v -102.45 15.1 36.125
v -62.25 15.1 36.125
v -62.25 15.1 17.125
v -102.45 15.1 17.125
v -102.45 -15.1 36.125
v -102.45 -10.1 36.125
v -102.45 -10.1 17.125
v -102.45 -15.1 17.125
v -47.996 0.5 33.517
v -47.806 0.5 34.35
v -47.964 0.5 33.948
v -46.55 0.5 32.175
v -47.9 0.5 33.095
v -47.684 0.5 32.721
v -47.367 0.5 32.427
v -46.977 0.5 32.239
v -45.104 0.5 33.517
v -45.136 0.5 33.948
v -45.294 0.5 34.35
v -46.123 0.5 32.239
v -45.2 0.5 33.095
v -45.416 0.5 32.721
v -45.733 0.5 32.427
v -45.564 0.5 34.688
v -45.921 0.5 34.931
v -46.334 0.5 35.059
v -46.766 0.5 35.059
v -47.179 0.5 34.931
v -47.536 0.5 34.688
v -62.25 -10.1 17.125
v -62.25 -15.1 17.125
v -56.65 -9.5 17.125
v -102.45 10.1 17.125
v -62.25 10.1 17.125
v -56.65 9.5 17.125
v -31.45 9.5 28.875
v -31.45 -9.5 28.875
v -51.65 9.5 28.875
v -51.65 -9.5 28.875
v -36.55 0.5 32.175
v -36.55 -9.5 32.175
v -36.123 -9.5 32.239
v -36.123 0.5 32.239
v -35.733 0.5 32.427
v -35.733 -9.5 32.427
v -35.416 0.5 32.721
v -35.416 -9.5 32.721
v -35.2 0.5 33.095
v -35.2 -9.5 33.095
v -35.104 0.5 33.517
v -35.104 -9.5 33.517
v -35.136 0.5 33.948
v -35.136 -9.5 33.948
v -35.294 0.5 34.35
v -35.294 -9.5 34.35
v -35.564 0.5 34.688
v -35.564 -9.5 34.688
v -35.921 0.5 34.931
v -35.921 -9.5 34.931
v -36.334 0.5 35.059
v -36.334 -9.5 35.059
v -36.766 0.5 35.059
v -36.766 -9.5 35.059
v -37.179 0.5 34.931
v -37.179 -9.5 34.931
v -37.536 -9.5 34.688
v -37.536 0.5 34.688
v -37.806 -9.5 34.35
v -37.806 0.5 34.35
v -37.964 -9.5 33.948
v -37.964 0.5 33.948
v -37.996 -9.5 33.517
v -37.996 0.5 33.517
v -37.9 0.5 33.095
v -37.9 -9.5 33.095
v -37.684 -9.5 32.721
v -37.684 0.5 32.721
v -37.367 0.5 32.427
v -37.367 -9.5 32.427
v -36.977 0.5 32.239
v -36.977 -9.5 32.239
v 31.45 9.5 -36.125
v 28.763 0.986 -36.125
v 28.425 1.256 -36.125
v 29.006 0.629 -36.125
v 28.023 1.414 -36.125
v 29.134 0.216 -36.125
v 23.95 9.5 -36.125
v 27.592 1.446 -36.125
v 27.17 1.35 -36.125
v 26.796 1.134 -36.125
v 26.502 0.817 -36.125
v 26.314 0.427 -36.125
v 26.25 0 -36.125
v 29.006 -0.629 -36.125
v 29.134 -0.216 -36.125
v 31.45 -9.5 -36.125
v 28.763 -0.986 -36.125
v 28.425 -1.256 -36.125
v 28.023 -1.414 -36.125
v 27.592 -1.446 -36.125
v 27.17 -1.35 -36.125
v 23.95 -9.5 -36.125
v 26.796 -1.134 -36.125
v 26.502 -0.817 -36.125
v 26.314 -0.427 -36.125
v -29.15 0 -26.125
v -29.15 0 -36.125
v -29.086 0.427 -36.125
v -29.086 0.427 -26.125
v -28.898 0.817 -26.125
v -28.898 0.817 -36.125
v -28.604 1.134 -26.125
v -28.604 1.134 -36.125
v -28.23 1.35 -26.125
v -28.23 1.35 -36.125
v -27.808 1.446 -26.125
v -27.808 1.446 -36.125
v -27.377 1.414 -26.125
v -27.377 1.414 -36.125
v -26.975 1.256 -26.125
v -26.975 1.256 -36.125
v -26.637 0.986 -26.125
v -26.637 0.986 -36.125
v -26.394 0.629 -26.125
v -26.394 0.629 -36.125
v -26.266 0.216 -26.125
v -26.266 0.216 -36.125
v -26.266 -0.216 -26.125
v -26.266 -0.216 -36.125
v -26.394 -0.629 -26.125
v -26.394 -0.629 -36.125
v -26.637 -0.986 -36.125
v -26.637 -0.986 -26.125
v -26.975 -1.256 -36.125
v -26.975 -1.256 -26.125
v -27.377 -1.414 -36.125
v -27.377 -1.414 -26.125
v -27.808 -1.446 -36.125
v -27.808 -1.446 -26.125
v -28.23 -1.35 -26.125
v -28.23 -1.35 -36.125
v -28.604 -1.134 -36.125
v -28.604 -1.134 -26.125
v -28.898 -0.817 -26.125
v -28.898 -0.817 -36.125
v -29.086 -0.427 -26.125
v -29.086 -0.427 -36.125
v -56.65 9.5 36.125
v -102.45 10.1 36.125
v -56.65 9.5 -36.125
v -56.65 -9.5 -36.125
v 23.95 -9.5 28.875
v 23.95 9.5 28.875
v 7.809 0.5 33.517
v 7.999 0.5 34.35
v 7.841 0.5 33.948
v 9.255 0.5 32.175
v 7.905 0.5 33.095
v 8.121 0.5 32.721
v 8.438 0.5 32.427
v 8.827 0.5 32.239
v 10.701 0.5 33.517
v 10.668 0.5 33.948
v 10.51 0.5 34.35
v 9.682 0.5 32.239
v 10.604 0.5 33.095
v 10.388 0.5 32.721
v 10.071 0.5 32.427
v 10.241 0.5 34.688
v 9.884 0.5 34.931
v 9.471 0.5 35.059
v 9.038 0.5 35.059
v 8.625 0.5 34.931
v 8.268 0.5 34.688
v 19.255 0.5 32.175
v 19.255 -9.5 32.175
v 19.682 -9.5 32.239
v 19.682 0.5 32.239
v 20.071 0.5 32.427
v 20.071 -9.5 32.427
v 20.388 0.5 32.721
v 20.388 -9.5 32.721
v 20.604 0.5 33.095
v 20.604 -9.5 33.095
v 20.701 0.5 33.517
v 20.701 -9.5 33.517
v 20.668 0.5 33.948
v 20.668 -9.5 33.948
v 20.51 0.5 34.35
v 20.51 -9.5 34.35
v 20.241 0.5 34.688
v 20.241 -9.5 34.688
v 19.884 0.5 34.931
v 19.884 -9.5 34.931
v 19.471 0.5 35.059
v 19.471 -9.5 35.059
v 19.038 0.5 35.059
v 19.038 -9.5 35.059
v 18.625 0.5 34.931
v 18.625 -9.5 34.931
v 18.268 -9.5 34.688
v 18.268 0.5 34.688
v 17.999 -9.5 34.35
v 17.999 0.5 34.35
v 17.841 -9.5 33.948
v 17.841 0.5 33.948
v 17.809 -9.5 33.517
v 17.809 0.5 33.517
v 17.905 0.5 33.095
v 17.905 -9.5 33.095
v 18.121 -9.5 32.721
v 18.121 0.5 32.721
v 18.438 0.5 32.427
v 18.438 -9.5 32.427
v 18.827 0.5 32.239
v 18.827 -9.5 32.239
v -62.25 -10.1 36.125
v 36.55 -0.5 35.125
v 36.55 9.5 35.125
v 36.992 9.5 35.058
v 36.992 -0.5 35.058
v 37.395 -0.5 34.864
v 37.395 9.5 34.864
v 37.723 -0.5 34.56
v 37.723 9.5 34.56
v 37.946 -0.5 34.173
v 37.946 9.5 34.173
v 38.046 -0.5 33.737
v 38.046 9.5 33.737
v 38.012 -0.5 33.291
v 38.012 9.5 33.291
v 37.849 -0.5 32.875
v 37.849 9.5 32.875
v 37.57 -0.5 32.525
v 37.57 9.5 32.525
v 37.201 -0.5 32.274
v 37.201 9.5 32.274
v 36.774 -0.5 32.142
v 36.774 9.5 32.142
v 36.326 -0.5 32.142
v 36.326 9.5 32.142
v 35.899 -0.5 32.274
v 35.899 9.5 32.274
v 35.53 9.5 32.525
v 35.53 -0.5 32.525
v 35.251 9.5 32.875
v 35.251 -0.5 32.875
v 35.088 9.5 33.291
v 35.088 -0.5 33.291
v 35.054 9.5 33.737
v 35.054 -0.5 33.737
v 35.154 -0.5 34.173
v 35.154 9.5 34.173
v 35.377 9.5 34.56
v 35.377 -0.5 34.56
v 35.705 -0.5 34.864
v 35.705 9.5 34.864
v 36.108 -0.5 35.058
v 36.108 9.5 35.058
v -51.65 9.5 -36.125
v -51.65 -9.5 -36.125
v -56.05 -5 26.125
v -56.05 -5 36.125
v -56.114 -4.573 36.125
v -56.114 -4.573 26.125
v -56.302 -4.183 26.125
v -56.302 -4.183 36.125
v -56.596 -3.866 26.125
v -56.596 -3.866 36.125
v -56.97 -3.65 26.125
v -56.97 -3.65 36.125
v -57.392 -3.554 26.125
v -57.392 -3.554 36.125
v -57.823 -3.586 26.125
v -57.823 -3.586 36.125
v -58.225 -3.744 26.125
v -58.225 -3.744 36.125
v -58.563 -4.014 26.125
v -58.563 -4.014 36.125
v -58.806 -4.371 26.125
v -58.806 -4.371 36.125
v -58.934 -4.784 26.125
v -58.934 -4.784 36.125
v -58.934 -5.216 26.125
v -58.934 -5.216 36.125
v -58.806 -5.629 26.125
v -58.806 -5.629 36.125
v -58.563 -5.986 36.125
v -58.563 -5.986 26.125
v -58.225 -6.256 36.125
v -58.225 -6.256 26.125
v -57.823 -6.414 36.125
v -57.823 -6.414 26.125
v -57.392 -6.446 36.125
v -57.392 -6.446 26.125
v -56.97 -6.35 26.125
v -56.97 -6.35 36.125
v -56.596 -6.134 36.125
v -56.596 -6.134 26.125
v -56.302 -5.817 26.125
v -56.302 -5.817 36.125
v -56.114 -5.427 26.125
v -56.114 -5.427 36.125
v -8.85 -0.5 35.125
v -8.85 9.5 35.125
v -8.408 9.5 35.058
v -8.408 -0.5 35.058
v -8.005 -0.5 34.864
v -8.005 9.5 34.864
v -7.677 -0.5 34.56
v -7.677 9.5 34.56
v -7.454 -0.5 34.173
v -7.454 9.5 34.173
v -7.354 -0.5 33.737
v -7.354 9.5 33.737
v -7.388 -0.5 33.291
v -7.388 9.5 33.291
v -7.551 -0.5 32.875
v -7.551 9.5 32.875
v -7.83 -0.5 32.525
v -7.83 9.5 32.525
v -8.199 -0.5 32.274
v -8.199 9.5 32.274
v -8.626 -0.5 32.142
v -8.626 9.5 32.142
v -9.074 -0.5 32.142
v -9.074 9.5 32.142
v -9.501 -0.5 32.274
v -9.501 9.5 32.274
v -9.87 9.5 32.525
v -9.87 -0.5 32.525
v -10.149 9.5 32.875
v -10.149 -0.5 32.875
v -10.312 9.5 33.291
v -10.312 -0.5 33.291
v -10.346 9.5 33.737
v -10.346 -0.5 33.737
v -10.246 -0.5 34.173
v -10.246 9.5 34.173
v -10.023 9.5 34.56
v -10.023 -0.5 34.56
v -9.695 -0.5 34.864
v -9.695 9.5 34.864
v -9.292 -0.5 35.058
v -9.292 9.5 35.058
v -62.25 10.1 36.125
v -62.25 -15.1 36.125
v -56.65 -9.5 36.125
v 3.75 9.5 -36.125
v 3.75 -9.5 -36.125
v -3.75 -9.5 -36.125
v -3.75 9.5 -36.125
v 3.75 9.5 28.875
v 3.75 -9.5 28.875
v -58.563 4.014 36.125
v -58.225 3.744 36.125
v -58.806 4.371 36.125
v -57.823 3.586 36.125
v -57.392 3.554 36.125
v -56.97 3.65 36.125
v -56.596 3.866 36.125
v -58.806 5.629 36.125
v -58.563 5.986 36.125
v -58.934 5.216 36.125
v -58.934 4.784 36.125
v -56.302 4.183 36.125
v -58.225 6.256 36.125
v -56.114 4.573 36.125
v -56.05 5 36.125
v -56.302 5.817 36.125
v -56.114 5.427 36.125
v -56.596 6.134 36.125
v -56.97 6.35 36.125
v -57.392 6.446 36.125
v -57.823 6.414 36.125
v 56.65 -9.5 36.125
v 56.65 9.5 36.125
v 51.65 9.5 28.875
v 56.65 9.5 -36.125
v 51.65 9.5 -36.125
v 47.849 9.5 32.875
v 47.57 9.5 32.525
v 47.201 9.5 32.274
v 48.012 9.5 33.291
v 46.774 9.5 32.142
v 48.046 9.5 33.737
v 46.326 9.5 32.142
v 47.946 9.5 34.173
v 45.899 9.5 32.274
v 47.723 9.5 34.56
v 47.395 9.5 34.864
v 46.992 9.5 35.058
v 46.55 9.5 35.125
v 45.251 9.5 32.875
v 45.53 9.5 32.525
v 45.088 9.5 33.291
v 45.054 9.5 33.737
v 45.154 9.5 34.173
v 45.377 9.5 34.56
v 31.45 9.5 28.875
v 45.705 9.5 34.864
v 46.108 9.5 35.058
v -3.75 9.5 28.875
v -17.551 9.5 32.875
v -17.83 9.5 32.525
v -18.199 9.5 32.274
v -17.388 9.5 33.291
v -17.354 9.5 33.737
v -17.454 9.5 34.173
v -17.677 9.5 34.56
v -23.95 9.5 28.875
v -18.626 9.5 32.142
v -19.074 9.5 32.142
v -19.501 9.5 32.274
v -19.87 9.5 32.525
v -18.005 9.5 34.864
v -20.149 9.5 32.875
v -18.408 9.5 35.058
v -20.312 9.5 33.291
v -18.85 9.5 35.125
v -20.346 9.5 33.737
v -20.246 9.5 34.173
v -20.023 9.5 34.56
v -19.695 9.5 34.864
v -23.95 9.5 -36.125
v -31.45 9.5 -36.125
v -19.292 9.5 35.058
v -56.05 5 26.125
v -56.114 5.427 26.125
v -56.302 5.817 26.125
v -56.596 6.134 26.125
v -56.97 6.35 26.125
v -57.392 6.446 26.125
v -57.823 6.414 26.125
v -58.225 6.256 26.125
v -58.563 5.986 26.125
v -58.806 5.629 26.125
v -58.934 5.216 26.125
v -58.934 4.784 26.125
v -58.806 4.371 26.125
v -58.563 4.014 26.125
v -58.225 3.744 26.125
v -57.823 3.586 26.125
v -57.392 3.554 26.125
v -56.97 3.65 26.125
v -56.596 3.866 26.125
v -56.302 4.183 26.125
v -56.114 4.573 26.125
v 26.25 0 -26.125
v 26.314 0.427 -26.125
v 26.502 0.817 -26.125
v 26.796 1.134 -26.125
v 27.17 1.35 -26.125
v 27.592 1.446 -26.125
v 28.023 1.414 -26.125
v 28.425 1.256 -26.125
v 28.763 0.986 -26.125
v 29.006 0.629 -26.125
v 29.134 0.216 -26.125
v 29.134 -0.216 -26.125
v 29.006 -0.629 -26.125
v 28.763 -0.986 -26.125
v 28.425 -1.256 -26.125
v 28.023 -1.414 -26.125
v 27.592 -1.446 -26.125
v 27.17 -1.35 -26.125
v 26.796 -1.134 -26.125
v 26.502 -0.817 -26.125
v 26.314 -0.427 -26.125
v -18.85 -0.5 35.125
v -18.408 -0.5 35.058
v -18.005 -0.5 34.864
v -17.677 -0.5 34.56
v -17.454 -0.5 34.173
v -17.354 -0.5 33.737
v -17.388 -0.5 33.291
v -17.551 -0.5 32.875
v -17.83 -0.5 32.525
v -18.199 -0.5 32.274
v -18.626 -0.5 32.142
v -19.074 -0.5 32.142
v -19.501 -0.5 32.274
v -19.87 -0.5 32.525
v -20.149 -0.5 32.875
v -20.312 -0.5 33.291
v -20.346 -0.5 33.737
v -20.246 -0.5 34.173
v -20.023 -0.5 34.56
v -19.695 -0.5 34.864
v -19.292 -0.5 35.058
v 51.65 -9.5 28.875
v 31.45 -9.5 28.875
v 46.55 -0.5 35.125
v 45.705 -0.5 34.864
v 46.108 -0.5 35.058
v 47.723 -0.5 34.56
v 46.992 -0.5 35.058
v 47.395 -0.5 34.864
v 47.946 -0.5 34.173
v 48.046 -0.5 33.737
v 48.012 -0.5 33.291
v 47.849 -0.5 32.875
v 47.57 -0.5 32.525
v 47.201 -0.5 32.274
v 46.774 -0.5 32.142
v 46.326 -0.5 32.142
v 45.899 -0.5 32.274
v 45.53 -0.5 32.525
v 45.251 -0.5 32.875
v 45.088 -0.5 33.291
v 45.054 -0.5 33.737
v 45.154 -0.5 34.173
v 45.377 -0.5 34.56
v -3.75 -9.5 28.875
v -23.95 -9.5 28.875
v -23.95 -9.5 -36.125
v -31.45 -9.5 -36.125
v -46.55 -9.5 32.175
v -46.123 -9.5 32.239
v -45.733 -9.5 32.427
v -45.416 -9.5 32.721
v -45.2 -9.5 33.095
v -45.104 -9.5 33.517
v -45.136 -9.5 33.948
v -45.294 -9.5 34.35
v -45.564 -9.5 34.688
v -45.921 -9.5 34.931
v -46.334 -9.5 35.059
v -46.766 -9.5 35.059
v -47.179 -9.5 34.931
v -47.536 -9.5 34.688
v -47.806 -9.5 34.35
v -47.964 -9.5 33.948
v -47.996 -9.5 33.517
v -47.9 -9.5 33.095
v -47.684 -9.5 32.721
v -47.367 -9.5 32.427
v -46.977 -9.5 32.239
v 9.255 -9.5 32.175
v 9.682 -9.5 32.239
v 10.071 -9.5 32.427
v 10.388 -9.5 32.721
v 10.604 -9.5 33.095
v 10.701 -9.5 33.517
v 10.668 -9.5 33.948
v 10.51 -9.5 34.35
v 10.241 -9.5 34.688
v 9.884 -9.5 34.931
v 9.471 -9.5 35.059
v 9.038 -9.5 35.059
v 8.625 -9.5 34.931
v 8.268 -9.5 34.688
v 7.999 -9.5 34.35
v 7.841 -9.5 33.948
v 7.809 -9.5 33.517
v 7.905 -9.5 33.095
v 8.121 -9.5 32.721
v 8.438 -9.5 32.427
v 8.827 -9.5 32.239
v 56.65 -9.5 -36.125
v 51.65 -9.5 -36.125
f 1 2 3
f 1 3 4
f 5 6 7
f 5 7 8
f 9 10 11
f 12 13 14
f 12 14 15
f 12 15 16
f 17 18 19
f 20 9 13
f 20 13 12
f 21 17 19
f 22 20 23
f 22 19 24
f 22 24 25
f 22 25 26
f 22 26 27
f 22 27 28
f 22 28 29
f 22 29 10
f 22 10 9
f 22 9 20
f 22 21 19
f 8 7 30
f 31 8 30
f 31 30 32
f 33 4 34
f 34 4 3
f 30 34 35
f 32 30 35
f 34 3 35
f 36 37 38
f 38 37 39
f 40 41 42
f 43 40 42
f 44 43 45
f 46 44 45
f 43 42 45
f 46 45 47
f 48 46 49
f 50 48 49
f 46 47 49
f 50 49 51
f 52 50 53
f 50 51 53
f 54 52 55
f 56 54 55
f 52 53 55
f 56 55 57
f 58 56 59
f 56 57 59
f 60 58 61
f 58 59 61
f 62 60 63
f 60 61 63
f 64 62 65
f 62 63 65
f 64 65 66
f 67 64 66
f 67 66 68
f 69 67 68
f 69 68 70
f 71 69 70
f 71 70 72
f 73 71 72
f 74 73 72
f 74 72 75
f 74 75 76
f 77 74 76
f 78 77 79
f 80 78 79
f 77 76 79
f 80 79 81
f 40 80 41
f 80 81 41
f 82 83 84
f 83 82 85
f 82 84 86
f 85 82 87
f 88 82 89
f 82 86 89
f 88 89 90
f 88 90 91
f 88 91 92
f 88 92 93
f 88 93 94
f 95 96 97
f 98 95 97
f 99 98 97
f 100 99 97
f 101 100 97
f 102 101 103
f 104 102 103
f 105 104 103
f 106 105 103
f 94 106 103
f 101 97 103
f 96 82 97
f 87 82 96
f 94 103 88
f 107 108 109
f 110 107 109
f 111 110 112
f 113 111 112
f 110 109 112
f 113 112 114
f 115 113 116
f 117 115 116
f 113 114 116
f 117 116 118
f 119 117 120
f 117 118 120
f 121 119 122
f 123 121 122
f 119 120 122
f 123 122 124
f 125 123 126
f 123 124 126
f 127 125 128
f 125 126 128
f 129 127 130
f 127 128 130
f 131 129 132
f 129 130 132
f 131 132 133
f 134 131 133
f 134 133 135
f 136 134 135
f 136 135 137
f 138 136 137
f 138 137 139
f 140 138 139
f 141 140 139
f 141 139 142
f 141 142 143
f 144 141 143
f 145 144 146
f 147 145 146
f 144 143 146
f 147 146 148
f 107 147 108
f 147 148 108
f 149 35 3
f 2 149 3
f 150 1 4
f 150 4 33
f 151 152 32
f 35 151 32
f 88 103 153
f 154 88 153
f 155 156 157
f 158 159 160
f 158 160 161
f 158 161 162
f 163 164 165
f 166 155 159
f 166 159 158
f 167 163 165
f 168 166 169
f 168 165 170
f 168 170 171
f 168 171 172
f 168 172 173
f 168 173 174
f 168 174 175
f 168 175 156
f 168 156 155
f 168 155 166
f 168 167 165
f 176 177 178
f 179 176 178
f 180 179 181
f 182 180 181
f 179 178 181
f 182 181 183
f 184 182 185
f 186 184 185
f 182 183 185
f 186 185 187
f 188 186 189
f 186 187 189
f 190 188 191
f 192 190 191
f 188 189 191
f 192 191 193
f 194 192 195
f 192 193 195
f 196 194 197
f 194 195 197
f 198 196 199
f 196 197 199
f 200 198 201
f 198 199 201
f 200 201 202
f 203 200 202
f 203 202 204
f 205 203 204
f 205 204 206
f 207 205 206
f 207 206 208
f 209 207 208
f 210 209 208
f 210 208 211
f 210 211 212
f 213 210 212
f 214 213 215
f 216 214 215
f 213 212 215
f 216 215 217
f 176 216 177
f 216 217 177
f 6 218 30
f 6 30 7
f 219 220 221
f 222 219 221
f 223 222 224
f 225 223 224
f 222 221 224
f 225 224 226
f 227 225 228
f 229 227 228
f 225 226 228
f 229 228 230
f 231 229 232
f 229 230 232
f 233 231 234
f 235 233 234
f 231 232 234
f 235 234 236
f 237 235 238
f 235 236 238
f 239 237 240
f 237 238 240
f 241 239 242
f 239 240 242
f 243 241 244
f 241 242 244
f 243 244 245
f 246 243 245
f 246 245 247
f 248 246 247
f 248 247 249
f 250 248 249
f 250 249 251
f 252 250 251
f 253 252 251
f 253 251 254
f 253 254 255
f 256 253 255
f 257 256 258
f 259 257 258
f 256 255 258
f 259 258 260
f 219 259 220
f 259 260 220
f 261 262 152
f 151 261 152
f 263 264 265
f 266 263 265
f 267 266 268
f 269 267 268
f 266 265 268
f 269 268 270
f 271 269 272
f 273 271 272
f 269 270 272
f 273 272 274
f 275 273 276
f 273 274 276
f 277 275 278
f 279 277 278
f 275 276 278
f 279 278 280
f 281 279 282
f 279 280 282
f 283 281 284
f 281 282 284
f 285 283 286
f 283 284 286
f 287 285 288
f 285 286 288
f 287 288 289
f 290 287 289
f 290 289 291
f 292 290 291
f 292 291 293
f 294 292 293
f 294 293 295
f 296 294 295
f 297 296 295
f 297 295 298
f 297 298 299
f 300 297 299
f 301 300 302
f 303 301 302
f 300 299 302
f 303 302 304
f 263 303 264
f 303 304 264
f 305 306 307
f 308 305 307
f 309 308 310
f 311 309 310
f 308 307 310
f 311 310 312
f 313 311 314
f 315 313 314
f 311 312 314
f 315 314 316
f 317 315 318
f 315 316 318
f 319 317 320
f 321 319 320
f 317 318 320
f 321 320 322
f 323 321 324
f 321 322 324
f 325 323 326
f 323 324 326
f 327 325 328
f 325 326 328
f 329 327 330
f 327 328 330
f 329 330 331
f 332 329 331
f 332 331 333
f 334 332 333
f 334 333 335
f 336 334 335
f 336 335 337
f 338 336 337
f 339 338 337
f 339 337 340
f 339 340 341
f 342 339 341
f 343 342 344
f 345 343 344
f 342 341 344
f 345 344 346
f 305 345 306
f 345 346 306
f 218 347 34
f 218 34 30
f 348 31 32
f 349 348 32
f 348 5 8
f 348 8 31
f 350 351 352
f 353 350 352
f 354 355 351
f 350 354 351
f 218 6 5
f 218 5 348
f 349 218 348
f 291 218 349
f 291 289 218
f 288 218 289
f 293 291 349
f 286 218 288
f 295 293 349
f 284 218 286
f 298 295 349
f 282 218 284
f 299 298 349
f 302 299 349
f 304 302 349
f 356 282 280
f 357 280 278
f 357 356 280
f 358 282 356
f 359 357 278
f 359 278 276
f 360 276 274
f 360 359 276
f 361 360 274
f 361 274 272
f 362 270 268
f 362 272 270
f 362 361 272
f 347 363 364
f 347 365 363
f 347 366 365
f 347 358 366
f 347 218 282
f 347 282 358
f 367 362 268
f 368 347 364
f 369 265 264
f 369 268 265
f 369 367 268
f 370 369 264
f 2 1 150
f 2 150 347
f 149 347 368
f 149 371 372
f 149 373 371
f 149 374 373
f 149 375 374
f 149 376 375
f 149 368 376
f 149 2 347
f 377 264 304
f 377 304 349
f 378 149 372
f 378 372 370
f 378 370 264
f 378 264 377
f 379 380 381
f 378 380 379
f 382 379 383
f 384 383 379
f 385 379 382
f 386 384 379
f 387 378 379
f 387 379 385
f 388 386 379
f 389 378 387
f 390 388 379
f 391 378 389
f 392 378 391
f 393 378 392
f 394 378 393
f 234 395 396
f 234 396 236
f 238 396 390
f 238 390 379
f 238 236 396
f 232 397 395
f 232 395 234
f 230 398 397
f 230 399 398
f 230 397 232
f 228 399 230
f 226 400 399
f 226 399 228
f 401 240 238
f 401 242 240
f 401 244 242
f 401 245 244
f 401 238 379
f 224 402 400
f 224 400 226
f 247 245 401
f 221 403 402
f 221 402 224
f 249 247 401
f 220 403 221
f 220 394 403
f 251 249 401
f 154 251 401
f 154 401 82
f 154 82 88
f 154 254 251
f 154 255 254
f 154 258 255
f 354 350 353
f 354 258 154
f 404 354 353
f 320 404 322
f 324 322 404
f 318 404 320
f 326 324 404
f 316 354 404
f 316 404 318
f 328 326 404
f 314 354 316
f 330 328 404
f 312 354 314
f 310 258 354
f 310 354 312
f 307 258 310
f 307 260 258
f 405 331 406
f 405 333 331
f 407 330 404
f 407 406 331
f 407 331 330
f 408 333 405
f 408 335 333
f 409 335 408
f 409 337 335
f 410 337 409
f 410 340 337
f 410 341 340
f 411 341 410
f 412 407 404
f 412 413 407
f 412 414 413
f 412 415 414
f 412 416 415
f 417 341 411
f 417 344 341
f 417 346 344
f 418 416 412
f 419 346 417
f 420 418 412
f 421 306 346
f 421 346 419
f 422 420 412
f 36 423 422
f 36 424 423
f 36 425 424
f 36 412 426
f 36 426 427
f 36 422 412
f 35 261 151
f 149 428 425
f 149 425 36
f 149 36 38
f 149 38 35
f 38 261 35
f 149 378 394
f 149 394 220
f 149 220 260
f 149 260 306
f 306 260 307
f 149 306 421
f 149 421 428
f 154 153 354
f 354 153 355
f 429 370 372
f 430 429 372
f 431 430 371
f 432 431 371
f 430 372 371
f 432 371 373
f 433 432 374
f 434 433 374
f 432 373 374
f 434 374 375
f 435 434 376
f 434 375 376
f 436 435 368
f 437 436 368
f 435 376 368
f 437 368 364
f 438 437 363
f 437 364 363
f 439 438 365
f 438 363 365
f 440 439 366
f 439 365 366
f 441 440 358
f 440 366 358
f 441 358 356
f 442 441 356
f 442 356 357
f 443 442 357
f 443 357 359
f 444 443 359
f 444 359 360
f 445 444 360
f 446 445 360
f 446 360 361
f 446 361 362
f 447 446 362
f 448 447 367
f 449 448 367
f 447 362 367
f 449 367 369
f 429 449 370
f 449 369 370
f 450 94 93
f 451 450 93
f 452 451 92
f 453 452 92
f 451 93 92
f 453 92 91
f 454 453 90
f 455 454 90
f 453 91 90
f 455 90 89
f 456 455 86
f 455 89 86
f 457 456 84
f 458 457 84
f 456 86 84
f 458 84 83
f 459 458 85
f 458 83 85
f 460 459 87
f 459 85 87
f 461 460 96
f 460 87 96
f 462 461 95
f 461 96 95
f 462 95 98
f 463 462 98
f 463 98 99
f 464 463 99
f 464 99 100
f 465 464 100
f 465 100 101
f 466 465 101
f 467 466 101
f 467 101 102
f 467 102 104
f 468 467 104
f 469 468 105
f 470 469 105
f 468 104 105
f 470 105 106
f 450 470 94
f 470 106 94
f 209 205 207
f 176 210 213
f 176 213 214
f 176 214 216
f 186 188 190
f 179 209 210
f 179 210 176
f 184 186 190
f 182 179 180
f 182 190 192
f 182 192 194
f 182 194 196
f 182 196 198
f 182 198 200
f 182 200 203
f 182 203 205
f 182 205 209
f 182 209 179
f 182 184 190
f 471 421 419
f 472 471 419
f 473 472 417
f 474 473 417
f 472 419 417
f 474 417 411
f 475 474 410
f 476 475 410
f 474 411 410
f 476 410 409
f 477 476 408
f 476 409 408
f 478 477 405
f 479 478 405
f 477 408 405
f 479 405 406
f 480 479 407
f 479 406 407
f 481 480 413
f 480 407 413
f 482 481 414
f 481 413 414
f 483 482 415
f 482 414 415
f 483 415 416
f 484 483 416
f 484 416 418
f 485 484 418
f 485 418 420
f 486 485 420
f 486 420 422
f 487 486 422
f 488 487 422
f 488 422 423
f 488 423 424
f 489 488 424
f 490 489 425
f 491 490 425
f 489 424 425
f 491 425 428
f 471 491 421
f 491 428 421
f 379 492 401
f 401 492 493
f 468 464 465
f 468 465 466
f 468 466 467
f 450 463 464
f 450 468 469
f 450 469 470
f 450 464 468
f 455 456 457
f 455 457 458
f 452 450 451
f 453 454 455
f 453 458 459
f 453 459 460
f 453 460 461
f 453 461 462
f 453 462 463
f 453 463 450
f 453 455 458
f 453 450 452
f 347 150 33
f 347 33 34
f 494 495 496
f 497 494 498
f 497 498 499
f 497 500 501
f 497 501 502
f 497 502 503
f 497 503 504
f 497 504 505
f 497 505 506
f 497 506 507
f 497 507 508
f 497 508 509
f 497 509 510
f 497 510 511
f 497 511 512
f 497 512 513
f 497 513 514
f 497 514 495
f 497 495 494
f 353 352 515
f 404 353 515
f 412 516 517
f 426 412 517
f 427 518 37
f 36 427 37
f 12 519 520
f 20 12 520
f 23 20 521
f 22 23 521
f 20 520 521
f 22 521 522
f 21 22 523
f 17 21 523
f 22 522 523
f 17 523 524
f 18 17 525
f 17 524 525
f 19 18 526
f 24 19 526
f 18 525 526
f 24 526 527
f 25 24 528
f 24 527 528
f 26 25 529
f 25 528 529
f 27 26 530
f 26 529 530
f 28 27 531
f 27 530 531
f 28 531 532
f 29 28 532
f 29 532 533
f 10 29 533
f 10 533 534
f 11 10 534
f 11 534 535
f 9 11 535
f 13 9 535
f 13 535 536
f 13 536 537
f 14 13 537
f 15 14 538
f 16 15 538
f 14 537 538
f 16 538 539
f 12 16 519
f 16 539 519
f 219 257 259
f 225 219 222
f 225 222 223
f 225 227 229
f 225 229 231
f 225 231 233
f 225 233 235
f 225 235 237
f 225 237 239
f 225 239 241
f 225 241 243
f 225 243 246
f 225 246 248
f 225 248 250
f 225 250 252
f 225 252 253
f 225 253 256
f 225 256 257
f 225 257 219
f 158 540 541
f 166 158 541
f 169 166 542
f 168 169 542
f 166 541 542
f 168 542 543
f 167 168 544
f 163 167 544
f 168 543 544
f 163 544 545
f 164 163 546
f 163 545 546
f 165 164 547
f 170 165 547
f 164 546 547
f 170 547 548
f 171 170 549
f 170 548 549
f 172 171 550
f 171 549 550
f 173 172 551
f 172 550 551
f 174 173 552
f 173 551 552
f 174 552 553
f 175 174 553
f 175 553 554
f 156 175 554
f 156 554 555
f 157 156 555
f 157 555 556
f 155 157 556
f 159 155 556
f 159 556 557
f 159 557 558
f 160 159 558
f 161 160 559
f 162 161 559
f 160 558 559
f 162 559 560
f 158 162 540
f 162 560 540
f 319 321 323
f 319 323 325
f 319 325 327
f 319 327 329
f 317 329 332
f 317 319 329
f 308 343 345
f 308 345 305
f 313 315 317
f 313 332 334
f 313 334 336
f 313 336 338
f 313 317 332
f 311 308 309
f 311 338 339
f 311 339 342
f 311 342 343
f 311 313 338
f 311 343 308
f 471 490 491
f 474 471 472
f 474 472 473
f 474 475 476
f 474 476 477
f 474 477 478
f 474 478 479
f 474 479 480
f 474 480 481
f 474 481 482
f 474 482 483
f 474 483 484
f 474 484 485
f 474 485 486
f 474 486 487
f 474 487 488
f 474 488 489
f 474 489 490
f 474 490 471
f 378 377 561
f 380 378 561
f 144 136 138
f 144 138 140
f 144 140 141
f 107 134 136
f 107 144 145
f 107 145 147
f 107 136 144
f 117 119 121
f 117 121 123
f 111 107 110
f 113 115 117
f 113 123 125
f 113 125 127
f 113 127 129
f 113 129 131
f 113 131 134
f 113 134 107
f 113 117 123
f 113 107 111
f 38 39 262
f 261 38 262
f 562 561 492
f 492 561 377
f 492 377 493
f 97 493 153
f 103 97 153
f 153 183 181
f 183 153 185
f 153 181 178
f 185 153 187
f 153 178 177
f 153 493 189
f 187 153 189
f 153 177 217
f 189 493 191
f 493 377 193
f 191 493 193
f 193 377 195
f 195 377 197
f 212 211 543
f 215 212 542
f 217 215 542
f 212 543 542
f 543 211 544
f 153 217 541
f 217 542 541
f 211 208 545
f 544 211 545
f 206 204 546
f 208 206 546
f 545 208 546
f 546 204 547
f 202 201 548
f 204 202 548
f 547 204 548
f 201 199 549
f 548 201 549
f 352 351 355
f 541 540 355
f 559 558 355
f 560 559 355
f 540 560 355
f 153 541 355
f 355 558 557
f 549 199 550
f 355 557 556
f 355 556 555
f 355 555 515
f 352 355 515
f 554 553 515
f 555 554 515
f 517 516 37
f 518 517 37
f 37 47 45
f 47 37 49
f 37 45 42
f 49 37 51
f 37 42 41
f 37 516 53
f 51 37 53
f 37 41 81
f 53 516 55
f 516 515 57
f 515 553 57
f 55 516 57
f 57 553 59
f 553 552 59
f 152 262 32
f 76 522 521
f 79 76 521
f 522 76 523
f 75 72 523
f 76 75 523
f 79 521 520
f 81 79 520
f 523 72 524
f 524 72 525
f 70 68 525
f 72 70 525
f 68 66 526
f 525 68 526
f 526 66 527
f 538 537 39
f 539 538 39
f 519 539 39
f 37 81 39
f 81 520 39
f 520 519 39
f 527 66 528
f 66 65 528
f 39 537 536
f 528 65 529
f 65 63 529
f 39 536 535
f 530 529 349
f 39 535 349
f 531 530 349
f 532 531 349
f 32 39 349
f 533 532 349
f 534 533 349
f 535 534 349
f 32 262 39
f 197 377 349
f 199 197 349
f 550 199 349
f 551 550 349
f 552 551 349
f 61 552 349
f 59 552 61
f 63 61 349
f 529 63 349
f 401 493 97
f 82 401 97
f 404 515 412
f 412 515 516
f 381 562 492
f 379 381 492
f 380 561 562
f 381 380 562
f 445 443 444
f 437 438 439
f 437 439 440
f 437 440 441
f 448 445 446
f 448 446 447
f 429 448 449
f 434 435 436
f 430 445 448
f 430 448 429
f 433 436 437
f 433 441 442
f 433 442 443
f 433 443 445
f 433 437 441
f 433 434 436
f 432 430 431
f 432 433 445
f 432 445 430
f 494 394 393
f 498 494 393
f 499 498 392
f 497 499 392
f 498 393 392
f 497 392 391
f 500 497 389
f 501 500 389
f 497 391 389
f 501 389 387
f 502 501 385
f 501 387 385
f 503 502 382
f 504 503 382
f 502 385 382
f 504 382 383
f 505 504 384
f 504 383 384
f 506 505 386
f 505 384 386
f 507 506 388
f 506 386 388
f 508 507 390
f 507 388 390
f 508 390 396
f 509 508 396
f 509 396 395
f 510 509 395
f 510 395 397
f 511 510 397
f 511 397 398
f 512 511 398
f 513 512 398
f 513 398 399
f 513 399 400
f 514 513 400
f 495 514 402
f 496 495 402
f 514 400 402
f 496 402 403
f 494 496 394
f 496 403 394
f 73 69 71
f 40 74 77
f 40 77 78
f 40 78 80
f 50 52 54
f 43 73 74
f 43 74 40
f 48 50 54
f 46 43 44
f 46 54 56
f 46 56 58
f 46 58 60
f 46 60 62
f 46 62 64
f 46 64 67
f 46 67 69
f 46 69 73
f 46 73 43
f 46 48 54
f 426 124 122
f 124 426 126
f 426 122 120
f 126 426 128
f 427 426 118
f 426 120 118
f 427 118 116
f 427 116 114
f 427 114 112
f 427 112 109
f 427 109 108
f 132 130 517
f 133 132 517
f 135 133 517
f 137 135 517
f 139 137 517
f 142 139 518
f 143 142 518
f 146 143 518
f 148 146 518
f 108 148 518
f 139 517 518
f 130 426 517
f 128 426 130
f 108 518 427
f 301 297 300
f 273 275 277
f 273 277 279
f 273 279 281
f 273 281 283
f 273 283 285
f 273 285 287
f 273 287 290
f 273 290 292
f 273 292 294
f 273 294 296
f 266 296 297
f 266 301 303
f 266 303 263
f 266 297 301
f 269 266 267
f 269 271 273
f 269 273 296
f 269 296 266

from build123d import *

# Parameters (mm, degrees)
BOSS_EXTRUDE1_DEPTH      = 9.5
BOSS_EXTRUDE1_DEPTH_BACK = 9.5
BOSS_EXTRUDE2_DEPTH      = 19
SKETCH4_R                = 1.45
CUT_EXTRUDE1_DEPTH       = 10
SKETCH5_R                = 1.5
CUT_EXTRUDE2_DEPTH       = 10
SKETCH6_R                = 1.45
CUT_EXTRUDE3_DEPTH       = 10
SKETCH7_R                = 1.45
CUT_EXTRUDE4_DEPTH       = 10


with BuildPart() as part:
    # Sketch2 → Boss-Extrude1 (new, two sides: drawn at the far end of the back side and taken through both)
    with BuildSketch(Plane(origin=(0, 0, 0), x_dir=(-1, 0, 0), z_dir=(0, 1, 0)).offset(-BOSS_EXTRUDE1_DEPTH_BACK)):
        Polygon((-23.95, 28.875), (-3.75, 28.875), (-3.75, -36.125), (3.75, -36.125), (3.75, 28.875), (23.95, 28.875), (23.95, -36.125), (31.45, -36.125), (31.45, 28.875), (51.65, 28.875), (51.65, -36.125), (56.65, -36.125), (56.65, 36.125), (-56.65, 36.125), (-56.65, -36.125), (-51.65, -36.125), (-51.65, 28.875), (-31.45, 28.875), (-31.45, -36.125), (-23.95, -36.125), align=None)
    extrude(amount=BOSS_EXTRUDE1_DEPTH + BOSS_EXTRUDE1_DEPTH_BACK)

    # Sketch3 → Boss-Extrude2 (add)
    with BuildSketch(Plane.XY.offset(36.125)):
        Polygon((-56.65, 9.5), (-62.25, 15.1), (-102.45, 15.1), (-102.45, 10.1), (-62.25, 10.1), (-62.25, -10.1), (-102.45, -10.1), (-102.45, -15.1), (-62.25, -15.1), (-56.65, -9.5), align=None)
    extrude(amount=-BOSS_EXTRUDE2_DEPTH)

    # Sketch4 → Cut-Extrude1 (cut)
    with BuildSketch(Plane.XY.offset(36.125)):
        with Locations((-57.5, 5)):
            Circle(SKETCH4_R)
        with Locations((-57.5, -5)):
            Circle(SKETCH4_R)
    extrude(amount=-CUT_EXTRUDE1_DEPTH, mode=Mode.SUBTRACT)

    # Sketch5 → Cut-Extrude2 (cut)
    with BuildSketch(Plane(origin=(0, 9.5, 0), x_dir=(-1, 0, 0), z_dir=(0, 1, 0))):
        with Locations((-46.55, 33.625)):
            Circle(SKETCH5_R)
        with Locations((-36.55, 33.625)):
            Circle(SKETCH5_R)
        with Locations((8.85, 33.625)):
            Circle(SKETCH5_R)
        with Locations((18.85, 33.625)):
            Circle(SKETCH5_R)
    extrude(amount=-CUT_EXTRUDE2_DEPTH, mode=Mode.SUBTRACT)

    # Sketch6 → Cut-Extrude3 (cut)
    with BuildSketch(Plane.XZ.offset(9.5)):
        with Locations((-46.55, 33.625)):
            Circle(SKETCH6_R)
        with Locations((-36.55, 33.625)):
            Circle(SKETCH6_R)
        with Locations((9.254566693, 33.625)):
            Circle(SKETCH6_R)
        with Locations((19.254566693, 33.625)):
            Circle(SKETCH6_R)
    extrude(amount=-CUT_EXTRUDE3_DEPTH, mode=Mode.SUBTRACT)

    # Sketch7 → Cut-Extrude4 (cut)
    with BuildSketch(Plane(origin=(0, 0, -36.125), x_dir=(1, 0, 0), z_dir=(0, 0, -1))):
        with Locations((-27.7, 0)):
            Circle(SKETCH7_R)
        with Locations((27.7, 0)):
            Circle(SKETCH7_R)
    extrude(amount=-CUT_EXTRUDE4_DEPTH, mode=Mode.SUBTRACT)


solid = part.part
